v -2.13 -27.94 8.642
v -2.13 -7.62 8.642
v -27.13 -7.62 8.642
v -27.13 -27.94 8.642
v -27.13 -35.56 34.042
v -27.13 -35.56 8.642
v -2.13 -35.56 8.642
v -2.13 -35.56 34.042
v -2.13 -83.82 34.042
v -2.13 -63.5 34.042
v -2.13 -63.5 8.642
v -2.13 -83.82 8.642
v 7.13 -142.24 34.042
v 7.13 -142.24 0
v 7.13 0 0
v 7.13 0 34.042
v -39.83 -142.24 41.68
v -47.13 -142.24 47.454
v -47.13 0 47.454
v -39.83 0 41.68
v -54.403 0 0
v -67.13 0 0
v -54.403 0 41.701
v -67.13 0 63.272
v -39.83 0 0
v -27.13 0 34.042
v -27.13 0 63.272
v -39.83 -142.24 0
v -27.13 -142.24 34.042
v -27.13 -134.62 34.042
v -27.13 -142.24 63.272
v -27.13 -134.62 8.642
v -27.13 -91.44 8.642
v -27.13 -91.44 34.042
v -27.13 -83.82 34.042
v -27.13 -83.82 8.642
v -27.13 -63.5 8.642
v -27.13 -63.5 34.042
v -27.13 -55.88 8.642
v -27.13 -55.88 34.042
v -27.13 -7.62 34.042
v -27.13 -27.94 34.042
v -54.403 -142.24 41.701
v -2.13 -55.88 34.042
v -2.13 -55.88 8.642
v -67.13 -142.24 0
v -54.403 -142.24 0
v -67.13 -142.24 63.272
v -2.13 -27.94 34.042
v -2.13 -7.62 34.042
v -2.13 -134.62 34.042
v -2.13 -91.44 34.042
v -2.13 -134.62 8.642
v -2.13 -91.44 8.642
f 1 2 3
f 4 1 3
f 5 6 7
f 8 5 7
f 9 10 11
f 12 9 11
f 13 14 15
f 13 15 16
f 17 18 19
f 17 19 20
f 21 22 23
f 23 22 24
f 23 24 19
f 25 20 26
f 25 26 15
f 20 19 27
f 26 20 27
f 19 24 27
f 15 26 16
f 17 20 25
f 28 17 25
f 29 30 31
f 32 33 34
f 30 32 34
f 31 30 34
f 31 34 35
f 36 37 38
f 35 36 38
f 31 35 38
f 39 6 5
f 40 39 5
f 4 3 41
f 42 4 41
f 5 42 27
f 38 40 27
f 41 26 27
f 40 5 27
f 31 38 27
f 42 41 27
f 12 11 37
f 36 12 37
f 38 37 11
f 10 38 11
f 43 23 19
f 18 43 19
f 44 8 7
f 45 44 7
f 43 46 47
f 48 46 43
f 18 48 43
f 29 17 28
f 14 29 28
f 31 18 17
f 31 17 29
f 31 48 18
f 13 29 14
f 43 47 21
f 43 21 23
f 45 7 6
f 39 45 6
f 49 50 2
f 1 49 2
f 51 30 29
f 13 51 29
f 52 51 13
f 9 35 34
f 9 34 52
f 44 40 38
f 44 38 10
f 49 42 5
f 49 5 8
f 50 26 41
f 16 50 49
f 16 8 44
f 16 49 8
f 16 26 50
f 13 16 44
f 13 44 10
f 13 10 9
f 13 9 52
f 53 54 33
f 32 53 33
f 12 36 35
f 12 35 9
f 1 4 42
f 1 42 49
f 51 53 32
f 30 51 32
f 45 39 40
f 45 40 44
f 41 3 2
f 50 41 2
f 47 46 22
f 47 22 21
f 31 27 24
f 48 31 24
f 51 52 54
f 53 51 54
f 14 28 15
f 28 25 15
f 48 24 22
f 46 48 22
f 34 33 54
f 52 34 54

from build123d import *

# Parameters (mm, degrees)
F0_W     = 0.026536879
F0_H     = 8.3333357554
F0_W_2   = 14.573463121
F1_DEPTH = 142.24
F2_W     = 27.8897660319
F2_H     = 8.4373559803
F3_DEPTH = 2.54
F4_W     = 25
F4_H     = 7.62
F5_DEPTH = 25.4


with BuildPart() as f1:
    # F0 (on Front) → F1 (new body)
    with BuildSketch(Plane.XZ):
        Polygon((-54.4296333165, 41.6801715141), (-54.4296333165, 16.0493828058), (-67.1296333165, 16.0493828058), (-67.1296333165, 0), (-54.4030964375, 0), (-54.4030964375, 41.7011594015), align=None)
        Polygon((-67.1296333165, 16.0493828058), (-54.4296333165, 16.0493828058), (-54.4296333165, 41.6801715141), (-67.1296333165, 31.6358038057), align=None)
        Polygon((-67.1296333165, 31.6358038057), (-54.4296333165, 41.6801715141), (-54.4296333165, 53.2272399031), (-56.5930453334, 54.9382718561), (-67.1296333165, 54.9382718561), align=None)
        Polygon((-54.4296333165, 53.2272399031), (-54.4296333165, 41.6801715141), (-54.4030964375, 41.7011594015), (-54.4030964375, 53.2062520157), align=None)
        Polygon((-56.5930453334, 54.9382718561), (-54.4296333165, 53.2272399031), (-54.4296333165, 54.9382718561), align=None)
        Polygon((-54.4296333165, 54.9382718561), (-54.4296333165, 53.2272399031), (-54.4030964375, 53.2062520157), (-54.4030964375, 54.9382718561), align=None)
        Polygon((-54.4030964375, 53.2062520157), (-54.4030964375, 41.7011594015), (-47.1296333165, 47.4537057086), align=None)
        Polygon((-67.1296333165, 63.2716076115), (-67.1296333165, 54.9382718561), (-56.5930453334, 54.9382718561), align=None)
        Polygon((-56.5930453334, 54.9382718561), (-54.4296333165, 54.9382718561), (-54.4296333165, 63.2716076115), (-67.1296333165, 63.2716076115), align=None)
        with Locations((-54.416364877, 59.1049397338)):
            Rectangle(F0_W, F0_H)
        Polygon((-54.4030964375, 54.9382718561), (-54.4030964375, 53.2062520157), (-47.1296333165, 47.4537057086), (-39.8296333165, 53.2272399031), (-39.8296333165, 54.9382718561), align=None)
        Polygon((-39.8296333165, 53.2272399031), (-47.1296333165, 47.4537057086), (-39.8296333165, 41.6801715141), align=None)
        with Locations((-47.116364877, 59.1049397338)):
            Rectangle(F0_W_2, F0_H)
        Polygon((-37.6662212996, 54.9382718561), (-39.8296333165, 53.2272399031), (-39.8296333165, 41.6801715141), (-27.1296333165, 31.6358038057), (-27.1296333165, 54.9382718561), align=None)
        Polygon((-39.8296333165, 54.9382718561), (-39.8296333165, 53.2272399031), (-37.6662212996, 54.9382718561), align=None)
        Polygon((-27.1296333165, 31.6358038057), (-39.8296333165, 41.6801715141), (-39.8296333165, 8.6419750216), (-39.8296333165, 0), (-27.1296333165, 0), (-27.1296333165, 8.6419750216), align=None)
        Polygon((-39.8296333165, 63.2716076115), (-39.8296333165, 54.9382718561), (-37.6662212996, 54.9382718561), (-27.1296333165, 63.2716076115), align=None)
        Polygon((-27.1296333165, 63.2716076115), (-37.6662212996, 54.9382718561), (-27.1296333165, 54.9382718561), align=None)
        Polygon((-2.1296333165, 8.6419750216), (-27.1296333165, 8.6419750216), (-27.1296333165, 0), (-2.1296333165, 0), (-2.1296333165, 1.0219750216), align=None)
        Polygon((-2.1296333165, 34.0419750216), (-2.1296333165, 8.6419750216), (-2.1296333165, 1.0219750216), (-2.1296333165, 0), (7.1296278669, 0), (7.1296278669, 1.0219750216), (7.1296278669, 34.0419750216), align=None)
    extrude(amount=F1_DEPTH)

    # F2 (on face) → F3 (join)
    with BuildSketch(Plane.XZ.offset(142.24)):
        with Locations((-25.8847503005, 4.2186779901)):
            Rectangle(F2_W, F2_H)
    extrude(amount=-F3_DEPTH)

    # F4 (on face) → F5 (join)
    with BuildSketch(Plane.XY.offset(8.6419750216)):
        with Locations((-14.6296333165, -87.63)):
            Rectangle(F4_W, F4_H)
        with Locations((-14.6296333165, -59.69)):
            Rectangle(F4_W, F4_H)
        with Locations((-14.6296333165, -31.75)):
            Rectangle(F4_W, F4_H)
        with Locations((-14.6296333165, -3.81)):
            Rectangle(F4_W, F4_H)
        Polygon((-2.1296333165, -139.7), (-2.1296333165, -134.62), (-27.1296333165, -134.62), (-27.1296333165, -142.24), (-2.1296333165, -142.24), align=None)
    extrude(amount=F5_DEPTH)


solid = f1.part
